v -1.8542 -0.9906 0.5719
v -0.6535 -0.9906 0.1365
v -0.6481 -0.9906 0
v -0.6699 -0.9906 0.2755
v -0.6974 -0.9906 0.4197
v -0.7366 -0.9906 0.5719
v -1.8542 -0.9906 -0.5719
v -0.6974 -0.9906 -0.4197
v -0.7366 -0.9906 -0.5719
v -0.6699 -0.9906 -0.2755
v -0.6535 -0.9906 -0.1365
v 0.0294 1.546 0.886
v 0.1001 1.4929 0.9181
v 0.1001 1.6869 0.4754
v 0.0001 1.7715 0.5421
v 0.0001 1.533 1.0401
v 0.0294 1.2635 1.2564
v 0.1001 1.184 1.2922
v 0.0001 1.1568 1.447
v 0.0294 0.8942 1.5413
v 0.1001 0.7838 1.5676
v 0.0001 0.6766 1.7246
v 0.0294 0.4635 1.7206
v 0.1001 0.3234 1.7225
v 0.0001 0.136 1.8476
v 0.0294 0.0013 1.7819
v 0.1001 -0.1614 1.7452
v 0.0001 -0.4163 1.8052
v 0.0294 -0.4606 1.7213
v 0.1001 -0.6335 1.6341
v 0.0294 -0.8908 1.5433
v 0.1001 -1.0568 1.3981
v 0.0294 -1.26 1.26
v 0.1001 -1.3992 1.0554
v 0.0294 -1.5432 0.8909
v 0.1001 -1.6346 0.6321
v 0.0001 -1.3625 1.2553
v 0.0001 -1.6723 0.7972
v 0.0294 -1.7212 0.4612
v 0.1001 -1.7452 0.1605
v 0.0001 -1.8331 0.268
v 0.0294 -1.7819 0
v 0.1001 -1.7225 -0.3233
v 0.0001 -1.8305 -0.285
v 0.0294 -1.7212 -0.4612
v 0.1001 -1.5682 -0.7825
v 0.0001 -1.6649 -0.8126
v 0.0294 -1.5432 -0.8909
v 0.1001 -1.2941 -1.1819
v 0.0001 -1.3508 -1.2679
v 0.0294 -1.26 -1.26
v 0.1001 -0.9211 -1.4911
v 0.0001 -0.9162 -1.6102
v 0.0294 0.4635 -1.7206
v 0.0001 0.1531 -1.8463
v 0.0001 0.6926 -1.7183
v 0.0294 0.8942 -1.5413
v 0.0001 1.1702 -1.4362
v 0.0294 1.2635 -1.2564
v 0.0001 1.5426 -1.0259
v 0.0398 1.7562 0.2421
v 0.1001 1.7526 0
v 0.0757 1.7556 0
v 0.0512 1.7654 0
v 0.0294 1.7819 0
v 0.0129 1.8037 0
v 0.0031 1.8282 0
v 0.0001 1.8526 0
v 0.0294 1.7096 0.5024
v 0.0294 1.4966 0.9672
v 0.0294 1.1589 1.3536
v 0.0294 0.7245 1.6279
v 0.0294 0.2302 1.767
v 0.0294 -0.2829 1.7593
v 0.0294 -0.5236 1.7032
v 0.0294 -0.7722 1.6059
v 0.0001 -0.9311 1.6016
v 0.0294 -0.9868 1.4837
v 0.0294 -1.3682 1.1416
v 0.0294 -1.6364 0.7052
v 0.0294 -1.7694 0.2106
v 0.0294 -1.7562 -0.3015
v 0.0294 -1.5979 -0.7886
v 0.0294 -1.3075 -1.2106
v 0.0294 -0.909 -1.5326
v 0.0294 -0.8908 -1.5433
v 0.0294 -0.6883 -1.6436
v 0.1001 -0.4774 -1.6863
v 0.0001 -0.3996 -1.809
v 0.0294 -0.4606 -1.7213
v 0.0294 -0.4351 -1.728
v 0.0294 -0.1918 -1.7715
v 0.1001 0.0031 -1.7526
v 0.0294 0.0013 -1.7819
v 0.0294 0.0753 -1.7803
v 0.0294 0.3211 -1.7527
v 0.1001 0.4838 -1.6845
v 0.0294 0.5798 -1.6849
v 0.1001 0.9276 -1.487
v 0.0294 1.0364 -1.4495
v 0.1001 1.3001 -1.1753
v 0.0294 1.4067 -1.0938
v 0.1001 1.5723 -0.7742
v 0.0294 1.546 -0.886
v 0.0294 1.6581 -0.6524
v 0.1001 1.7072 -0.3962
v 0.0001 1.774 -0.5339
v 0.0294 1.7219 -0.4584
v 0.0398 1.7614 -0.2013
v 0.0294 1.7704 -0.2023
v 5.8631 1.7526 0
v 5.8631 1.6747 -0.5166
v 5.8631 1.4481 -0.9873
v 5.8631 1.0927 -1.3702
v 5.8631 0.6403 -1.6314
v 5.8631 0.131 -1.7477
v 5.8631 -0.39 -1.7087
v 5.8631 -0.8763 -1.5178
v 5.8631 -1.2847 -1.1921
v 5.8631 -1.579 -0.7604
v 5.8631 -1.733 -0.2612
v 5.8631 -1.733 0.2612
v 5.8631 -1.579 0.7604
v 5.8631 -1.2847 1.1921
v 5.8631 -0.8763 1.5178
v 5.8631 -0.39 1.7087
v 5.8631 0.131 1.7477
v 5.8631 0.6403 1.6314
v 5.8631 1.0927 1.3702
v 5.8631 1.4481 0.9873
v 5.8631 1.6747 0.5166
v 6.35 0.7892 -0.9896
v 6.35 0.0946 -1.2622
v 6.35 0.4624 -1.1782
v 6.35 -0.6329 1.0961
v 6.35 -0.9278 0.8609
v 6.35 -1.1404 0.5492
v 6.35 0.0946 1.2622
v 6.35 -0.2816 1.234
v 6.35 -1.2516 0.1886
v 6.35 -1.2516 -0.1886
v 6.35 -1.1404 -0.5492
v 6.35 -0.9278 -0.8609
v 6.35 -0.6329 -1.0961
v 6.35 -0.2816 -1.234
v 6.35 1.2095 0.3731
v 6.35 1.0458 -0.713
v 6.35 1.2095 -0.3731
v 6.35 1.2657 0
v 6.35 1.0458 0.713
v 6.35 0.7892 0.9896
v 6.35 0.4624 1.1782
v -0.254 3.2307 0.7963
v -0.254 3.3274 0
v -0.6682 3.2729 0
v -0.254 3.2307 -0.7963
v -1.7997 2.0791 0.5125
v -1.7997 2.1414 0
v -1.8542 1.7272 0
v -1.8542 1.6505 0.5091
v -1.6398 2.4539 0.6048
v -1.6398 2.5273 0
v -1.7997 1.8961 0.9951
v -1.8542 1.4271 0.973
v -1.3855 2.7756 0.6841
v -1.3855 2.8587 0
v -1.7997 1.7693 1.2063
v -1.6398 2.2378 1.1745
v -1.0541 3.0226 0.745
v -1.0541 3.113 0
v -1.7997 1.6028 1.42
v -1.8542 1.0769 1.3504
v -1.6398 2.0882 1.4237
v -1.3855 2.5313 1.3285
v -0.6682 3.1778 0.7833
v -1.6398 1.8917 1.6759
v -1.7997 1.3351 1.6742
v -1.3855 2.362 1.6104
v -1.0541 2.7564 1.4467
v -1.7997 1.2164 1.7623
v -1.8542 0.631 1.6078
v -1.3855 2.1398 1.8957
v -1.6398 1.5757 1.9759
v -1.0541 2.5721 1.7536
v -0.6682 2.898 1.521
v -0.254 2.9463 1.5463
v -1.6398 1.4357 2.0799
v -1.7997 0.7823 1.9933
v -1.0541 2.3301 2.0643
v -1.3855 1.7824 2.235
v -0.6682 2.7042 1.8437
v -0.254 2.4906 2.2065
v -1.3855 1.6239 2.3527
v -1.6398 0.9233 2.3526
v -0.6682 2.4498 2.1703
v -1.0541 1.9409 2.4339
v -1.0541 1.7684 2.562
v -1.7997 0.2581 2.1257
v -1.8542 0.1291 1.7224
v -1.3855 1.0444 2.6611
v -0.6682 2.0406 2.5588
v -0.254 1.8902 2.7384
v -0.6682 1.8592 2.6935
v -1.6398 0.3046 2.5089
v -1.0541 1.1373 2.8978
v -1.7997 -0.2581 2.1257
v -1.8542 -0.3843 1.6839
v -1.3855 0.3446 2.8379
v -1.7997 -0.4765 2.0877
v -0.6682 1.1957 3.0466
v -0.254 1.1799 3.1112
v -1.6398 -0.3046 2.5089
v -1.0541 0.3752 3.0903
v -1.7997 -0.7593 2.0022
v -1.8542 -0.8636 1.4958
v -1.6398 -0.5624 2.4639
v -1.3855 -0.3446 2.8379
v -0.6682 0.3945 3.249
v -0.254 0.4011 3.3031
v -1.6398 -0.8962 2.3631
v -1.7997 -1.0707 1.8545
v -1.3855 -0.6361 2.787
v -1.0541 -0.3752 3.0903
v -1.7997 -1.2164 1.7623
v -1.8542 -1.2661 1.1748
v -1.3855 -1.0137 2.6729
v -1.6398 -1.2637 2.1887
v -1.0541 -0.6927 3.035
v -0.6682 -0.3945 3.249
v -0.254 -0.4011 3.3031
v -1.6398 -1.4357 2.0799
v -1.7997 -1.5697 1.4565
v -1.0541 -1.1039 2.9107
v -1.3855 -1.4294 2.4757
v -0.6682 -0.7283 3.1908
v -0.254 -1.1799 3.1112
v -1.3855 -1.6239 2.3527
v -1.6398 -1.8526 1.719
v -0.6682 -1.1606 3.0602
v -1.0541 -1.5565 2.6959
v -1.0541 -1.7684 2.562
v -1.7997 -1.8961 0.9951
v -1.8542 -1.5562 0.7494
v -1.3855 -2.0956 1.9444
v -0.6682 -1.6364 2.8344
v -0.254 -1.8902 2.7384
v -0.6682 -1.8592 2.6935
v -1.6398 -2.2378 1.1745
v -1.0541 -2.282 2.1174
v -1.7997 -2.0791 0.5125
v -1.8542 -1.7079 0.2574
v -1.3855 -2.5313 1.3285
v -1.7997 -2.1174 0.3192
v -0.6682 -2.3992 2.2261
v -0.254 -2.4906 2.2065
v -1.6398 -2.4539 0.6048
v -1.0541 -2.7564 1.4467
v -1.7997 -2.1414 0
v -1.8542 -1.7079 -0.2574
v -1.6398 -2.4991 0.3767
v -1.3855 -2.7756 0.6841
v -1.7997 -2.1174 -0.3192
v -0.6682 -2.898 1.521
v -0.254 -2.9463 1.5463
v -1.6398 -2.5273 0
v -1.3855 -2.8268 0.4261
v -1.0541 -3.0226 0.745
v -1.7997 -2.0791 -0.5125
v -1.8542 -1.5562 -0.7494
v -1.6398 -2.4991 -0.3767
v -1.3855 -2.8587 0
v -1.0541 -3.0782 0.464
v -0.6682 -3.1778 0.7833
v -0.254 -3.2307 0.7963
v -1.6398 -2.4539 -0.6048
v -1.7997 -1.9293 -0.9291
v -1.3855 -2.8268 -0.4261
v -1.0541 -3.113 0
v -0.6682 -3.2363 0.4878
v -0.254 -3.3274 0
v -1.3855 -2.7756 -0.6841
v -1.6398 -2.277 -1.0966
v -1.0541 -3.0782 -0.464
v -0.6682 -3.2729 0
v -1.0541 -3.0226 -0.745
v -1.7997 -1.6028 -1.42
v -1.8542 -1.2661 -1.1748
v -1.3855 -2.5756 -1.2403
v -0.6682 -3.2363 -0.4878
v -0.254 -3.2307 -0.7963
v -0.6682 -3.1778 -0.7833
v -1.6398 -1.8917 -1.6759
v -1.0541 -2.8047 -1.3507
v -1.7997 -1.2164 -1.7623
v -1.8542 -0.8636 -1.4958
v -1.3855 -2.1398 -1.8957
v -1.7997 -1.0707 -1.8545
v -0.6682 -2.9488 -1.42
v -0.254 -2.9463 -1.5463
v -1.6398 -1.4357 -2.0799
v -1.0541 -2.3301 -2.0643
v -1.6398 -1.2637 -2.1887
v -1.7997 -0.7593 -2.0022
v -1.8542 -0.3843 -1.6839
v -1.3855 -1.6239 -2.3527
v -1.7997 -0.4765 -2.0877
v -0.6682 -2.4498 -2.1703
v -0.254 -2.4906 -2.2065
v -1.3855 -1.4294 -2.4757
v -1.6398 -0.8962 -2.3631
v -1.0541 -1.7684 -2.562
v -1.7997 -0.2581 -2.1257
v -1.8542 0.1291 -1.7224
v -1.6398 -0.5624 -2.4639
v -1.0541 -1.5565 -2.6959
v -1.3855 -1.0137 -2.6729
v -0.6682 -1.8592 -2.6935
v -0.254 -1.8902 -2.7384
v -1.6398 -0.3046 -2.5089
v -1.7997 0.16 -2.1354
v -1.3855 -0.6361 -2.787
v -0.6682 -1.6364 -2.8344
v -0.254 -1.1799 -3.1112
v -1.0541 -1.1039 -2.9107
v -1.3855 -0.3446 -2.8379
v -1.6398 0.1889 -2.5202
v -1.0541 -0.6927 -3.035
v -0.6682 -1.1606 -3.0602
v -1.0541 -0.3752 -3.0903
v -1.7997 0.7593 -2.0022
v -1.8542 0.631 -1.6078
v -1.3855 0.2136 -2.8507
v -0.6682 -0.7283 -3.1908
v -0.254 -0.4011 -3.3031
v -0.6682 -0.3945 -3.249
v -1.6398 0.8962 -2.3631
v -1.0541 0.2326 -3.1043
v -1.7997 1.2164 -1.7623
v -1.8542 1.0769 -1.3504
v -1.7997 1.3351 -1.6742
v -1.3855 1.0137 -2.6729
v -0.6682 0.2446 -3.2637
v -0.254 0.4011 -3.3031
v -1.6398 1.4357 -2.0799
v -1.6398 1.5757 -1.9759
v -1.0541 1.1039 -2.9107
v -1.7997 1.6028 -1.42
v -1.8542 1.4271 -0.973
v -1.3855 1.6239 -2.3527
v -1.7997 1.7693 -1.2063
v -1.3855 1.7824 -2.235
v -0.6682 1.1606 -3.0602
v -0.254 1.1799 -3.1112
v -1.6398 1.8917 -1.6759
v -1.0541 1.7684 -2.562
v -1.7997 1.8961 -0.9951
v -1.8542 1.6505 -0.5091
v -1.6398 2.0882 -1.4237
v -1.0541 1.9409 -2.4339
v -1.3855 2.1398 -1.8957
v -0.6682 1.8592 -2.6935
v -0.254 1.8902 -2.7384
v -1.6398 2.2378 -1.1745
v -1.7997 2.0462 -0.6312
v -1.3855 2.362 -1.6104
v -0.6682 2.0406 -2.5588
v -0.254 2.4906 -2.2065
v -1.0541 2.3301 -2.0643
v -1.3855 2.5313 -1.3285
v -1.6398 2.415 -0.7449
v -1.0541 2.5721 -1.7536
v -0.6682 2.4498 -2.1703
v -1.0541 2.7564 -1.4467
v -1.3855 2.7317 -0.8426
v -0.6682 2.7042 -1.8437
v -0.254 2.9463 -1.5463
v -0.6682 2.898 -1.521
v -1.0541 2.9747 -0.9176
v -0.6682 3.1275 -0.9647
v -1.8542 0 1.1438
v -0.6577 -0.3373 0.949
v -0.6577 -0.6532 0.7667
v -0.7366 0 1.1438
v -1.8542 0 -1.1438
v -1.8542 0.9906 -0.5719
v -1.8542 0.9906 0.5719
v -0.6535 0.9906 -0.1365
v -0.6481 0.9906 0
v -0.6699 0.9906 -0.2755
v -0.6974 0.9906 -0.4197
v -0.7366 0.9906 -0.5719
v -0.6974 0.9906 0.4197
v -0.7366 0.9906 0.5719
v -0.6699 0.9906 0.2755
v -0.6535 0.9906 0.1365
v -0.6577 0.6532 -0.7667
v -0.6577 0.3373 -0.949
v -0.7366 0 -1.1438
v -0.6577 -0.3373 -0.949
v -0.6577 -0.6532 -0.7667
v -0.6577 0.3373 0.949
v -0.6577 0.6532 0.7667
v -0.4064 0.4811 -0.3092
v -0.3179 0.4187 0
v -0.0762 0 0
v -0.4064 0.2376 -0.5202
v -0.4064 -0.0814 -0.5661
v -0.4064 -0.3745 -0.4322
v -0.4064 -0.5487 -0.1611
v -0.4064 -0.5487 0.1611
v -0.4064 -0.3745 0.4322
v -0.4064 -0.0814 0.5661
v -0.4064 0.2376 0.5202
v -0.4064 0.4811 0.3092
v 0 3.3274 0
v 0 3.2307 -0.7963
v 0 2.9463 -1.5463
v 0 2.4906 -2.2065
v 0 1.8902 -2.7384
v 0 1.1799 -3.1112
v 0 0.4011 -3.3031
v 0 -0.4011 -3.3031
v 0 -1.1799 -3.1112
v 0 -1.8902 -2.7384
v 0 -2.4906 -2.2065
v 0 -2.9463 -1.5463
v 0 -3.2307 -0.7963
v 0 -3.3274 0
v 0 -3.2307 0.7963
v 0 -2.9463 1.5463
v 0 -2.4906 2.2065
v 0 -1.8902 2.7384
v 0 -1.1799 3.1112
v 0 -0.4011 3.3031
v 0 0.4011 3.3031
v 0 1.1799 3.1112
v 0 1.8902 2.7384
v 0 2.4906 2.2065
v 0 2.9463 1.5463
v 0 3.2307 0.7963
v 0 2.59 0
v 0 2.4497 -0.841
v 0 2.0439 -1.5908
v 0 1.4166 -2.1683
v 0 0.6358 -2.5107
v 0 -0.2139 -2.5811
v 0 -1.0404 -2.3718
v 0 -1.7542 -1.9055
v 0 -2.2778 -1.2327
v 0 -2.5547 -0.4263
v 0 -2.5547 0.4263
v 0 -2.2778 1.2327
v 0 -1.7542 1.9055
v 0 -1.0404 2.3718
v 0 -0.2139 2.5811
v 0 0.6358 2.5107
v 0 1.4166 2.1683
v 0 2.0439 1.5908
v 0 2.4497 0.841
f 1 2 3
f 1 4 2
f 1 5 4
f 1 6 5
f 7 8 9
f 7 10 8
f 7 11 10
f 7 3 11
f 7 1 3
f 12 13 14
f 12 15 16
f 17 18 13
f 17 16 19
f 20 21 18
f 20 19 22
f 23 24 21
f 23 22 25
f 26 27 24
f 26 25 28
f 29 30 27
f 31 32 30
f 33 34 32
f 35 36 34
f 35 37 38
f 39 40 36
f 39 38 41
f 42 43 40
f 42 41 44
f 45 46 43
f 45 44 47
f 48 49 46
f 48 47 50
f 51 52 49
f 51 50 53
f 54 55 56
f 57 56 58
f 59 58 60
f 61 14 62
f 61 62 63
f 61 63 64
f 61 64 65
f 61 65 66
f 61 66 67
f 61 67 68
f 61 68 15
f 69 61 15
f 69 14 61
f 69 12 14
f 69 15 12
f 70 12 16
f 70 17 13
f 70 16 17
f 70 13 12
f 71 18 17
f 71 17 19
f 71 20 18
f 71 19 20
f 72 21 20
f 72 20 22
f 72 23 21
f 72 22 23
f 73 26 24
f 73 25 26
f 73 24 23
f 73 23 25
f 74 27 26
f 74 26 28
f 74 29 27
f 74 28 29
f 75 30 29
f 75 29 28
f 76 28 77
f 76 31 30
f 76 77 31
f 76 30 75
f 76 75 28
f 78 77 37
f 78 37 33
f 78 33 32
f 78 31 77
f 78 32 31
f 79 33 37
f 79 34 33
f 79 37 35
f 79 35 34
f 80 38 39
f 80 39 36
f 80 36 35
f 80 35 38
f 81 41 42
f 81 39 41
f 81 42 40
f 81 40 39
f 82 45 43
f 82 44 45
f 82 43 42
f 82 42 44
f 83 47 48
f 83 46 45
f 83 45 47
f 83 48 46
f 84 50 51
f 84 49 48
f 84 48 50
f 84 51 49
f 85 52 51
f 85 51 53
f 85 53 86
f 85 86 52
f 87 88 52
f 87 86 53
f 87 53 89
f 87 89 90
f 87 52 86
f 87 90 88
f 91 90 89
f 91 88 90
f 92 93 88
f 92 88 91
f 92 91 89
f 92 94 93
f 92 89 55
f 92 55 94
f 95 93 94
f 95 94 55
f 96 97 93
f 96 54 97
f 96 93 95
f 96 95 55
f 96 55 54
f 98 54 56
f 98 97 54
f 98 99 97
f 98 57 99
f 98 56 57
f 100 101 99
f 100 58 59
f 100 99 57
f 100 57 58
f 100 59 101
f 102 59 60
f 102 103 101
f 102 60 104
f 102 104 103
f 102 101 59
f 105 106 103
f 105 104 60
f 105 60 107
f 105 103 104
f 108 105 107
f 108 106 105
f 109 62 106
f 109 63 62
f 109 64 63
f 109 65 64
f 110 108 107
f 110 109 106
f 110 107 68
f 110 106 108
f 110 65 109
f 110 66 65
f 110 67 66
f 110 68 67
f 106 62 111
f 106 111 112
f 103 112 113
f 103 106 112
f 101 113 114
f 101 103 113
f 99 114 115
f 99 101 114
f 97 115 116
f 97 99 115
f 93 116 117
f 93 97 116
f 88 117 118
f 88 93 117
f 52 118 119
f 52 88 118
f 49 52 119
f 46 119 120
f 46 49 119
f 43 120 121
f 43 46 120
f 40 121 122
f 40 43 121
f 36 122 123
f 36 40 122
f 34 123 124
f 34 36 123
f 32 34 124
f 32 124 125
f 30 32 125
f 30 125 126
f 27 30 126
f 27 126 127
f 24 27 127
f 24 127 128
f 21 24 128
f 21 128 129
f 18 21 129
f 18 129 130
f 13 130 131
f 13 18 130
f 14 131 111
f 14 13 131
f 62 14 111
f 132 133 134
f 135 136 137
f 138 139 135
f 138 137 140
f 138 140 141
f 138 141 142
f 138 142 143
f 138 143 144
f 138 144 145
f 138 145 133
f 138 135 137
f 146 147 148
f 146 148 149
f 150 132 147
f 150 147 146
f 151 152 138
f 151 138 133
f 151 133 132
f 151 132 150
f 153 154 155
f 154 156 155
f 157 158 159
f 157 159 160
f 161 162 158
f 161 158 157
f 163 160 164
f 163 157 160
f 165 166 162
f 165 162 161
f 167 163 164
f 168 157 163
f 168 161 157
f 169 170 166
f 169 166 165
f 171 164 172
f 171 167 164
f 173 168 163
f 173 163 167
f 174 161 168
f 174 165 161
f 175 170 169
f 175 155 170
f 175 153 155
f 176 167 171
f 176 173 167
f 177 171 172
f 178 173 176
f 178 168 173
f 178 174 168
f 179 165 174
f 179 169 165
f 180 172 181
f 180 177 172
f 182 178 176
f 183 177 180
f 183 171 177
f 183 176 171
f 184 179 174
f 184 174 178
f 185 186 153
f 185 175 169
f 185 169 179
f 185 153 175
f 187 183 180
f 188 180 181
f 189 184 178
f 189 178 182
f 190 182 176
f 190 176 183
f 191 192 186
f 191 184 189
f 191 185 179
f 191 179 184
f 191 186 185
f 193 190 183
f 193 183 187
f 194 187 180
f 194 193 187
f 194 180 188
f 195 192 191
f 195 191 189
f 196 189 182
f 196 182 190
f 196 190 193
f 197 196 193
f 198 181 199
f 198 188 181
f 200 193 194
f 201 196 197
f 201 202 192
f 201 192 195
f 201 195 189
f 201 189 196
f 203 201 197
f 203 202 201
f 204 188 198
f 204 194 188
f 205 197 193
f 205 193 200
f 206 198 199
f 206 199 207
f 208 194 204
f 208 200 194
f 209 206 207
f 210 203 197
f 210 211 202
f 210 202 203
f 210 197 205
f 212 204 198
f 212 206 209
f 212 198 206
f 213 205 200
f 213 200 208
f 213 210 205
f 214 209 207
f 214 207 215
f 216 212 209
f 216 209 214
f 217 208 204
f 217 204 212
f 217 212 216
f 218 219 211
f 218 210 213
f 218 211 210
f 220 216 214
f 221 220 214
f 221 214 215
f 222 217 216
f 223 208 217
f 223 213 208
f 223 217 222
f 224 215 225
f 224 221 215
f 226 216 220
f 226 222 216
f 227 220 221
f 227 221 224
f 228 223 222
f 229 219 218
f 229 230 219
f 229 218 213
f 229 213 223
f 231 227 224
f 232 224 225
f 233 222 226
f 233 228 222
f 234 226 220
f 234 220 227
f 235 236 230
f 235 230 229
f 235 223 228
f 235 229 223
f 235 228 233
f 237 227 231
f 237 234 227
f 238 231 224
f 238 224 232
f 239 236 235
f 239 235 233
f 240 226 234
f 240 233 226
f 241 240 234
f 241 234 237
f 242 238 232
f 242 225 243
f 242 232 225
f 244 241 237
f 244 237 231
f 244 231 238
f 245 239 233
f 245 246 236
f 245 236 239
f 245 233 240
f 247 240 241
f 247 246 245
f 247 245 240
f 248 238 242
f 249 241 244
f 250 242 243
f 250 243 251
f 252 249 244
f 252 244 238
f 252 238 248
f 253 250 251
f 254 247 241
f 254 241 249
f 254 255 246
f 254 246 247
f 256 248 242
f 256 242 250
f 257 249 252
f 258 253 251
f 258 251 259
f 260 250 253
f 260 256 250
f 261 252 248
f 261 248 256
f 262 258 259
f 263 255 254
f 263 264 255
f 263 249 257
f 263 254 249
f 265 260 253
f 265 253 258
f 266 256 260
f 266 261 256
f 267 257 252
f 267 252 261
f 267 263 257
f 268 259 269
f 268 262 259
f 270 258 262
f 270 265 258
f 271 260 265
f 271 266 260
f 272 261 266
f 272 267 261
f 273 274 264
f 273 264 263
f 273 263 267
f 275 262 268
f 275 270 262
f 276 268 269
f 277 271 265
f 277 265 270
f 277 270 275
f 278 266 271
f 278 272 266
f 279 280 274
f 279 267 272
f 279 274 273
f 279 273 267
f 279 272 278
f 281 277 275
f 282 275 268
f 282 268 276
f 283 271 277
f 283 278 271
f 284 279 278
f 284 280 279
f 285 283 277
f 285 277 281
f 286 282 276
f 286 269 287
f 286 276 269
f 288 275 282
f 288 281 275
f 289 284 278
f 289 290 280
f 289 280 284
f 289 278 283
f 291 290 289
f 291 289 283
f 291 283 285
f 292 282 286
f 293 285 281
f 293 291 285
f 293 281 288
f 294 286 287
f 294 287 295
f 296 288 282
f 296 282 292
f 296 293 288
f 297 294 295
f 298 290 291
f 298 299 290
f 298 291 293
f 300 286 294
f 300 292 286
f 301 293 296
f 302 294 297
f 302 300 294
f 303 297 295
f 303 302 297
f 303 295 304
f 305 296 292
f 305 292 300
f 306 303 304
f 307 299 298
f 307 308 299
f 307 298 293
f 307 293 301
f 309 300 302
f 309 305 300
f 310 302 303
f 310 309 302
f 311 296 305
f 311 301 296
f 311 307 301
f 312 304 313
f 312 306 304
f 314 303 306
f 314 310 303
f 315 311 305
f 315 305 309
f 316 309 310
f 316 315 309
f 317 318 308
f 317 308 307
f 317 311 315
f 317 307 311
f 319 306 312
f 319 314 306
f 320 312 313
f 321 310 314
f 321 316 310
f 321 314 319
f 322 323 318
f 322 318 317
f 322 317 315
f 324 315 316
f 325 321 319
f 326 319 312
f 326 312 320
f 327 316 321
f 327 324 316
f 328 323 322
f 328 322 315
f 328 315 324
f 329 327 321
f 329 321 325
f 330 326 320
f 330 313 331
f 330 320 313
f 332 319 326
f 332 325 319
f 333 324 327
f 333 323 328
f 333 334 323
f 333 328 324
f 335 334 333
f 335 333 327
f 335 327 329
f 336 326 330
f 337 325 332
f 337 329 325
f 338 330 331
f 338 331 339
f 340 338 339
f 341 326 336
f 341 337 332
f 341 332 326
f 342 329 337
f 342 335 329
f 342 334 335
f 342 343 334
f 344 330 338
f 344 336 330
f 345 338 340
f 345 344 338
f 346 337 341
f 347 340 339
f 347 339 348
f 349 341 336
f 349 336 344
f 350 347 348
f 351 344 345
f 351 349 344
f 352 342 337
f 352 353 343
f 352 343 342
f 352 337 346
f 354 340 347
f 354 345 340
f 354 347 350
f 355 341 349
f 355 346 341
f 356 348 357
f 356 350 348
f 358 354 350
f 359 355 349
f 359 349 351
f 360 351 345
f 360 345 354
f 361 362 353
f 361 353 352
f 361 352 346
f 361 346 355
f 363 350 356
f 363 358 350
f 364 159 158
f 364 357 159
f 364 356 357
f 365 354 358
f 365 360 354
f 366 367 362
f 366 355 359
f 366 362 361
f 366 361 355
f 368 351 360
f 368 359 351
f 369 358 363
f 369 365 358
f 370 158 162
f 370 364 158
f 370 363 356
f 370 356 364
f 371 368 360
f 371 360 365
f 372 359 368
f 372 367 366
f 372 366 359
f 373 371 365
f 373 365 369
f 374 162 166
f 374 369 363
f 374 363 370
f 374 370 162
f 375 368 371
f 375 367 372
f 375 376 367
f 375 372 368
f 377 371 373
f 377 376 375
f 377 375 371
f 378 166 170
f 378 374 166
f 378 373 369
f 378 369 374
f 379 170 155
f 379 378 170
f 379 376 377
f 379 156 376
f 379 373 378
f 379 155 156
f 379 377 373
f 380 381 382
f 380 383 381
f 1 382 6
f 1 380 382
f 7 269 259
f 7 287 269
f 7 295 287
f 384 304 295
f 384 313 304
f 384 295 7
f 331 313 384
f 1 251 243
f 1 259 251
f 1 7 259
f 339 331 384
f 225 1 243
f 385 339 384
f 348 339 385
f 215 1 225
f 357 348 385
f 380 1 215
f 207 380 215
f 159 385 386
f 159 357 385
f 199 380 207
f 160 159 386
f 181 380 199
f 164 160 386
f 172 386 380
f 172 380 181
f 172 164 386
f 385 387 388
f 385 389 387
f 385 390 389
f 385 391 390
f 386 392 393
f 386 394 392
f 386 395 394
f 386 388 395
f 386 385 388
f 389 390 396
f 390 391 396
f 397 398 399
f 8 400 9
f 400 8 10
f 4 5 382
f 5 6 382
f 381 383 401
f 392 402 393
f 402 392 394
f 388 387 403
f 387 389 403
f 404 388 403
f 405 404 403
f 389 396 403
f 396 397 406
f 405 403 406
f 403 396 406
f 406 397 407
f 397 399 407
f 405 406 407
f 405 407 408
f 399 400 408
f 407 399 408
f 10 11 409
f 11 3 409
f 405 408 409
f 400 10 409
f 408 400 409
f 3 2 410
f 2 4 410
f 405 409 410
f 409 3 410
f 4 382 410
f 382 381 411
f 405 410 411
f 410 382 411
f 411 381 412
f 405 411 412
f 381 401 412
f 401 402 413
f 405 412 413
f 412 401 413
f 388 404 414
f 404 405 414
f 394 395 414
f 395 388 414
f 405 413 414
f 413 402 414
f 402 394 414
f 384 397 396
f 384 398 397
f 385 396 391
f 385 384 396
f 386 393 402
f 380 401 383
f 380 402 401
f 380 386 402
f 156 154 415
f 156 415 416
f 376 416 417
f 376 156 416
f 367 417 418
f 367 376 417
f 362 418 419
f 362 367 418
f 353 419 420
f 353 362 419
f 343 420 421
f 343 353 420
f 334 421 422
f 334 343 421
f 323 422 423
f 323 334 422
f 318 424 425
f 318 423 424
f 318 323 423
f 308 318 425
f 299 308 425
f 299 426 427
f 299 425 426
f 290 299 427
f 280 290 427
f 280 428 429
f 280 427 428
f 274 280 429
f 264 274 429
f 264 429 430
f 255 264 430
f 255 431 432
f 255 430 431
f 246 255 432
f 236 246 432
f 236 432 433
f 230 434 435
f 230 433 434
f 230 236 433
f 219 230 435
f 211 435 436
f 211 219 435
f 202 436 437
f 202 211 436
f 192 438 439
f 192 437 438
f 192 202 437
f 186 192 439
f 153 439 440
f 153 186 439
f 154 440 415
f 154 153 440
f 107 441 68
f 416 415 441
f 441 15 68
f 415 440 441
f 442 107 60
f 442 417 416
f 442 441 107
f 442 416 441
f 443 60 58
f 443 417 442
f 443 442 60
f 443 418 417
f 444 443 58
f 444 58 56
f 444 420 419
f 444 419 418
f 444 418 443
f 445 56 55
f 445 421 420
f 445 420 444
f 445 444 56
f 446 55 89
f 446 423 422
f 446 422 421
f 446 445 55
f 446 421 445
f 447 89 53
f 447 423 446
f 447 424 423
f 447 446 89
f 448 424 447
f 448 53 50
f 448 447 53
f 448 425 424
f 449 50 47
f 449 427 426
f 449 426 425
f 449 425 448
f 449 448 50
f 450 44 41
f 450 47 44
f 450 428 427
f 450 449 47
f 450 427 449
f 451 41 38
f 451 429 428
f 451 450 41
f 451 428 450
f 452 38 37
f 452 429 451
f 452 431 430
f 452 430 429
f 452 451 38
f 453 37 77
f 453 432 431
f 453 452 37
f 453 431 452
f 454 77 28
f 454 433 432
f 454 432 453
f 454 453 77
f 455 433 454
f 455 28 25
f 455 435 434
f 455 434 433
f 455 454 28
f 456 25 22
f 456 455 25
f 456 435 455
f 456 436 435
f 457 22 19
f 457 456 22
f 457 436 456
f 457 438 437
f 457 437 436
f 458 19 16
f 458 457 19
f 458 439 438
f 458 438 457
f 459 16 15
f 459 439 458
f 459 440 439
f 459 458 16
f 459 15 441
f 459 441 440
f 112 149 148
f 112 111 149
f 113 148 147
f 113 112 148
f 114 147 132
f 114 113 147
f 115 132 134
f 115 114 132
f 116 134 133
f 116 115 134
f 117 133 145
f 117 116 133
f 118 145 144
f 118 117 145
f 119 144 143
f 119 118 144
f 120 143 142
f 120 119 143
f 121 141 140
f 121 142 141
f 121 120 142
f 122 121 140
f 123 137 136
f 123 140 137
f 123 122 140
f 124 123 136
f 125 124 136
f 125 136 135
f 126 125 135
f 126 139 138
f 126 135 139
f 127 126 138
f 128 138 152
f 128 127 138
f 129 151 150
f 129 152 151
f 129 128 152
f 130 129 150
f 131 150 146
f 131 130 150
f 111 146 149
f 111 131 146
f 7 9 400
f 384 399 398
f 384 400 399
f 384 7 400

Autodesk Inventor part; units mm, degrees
ref_plane "YZ Plane" through (0, 0, 0) normal (1, 0, 0) x (0, 1, 0)
ref_plane "XZ Plane" through (0, 0, 0) normal (0, 1, 0) x (-1, 0, 0)
sketch "Sketch1" plane through (0, 0, 0) normal (0, 0, 1) x (1, 0, 0)
  line L0 (-0.0762, 0) -> (6.35, 0)
  line L1 (6.35, 0) -> (6.35, 1.7526)
  line L2 (6.35, 1.7526) -> (1.5902, 1.7526)
  line L3 (1.5902, 1.7526) -> (0.0001, 1.7526)
  line L4 (0.0001, 1.7526) -> (0, 1.7526)
  line L5 (0, 1.7526) -> (0, 3.3274)
  line L6 (0, 3.3274) -> (-1.8542, 3.3274)
  line L7 (-1.8542, 3.3274) -> (-1.8542, 1.1438)
  line L8 (-1.8542, 1.1438) -> (-0.7366, 1.1438)
  line L9 (-0.7366, 1.1438) -> (-0.0762, 0)
  line L10 (-3.495, 0) -> (7.9908, 0) projected
  line L11 (0, -0.6655) -> (0, 3.9929) projected
  line L12 (1.5902, 1.7526) -> (0, 1.7526) construction
  dimension "d1" = 4.7598
  dimension "d2" = 1.5901
  dimension "d3" = 1.8542
  dimension "d4" = 1.1176
  dimension "d5" = 60
  dimension "d6" = 3.5052
  dimension "d7" = 3.5052
  dimension "d8" = 2.2877
  dimension "d9" = 6.6548
  dimension "d26" = 6.35
revolve "Body" add sketch "Sketch1" angle 360 about axis through (-0.0762, 0, 0) along (1, 0, 0)
sketch "Sketch2" plane through (-1.8542, 0, 0) normal (-1, 0, 0) x (0, 0, 1)
  circle A0 centre (0, 0) radius 1.1438 projected
  line L0 (0, -4.6584) -> (0, 4.6584) projected
  line L1 (-4.6584, 0) -> (4.6584, 0) projected
  line L2 (1.1438, 0) -> (0.5719, -0.9906)
  line L3 (0.5719, -0.9906) -> (-0.5719, -0.9906)
  line L4 (-0.5719, -0.9906) -> (-1.1438, 0)
  line L5 (-1.1438, 0) -> (-0.5719, 0.9906)
  line L6 (-0.5719, 0.9906) -> (0.5719, 0.9906)
  line L7 (0.5719, 0.9906) -> (1.1438, 0)
  point P0 (0, 0)
extrude "Slot" add sketch "Sketch2" against normal up to next contours L7 A0 | A0 L2 | L6 L0 A0 | A0 L0 L3 | L0 L6 A0 | A0 L3 L0 | L4 A0 | A0 L5
fillet "Fillet1" radius 1.6002 1 edges at (-1.8542, -3.3274, 0)
thread "Thread" size "6-32 UNC" class "2A" standard "ANSI Unified Screw Threads" length 4.7598
chamfer "Chamfer1" distance 0.4869 distance2 0.4869 1 edges at (6.35, -1.7526, 0) measured on face at (6.35, -0.5672, -0.1398)
ref_plane "Work Plane1" through (29, 0, 0) normal (0, -1, 0) x (1, 0, 0)
fillet "Fillet2" radius 0.1 1 edges at (0.0001, -1.7526, 0)
equation "\"d1\" = GEL"
equation "\"d3\" = KOH"
equation "\"d4\" = INTI"
equation "\"d6\" = GD"
equation "\"d7\" = BDM"
equation "\"d8\" = 1.1547 * SW"
equation "\"d9\" = KOD"
equation "\"d26\" = NLG"
equation "\"d30\" = R"
equation "\"d17\" = RR"
equation "\"d13\" = GEL"
equation "\"d15\" = -0.5 * SPD + 0.5 * GD"
equation "\"d16\" = GUL"
equation "\"GD\" = NND"
equation "\"NLG\" = 6.35"
equation "\"GEL\" = 4.75976"
equation "\"KOD\" = 6.6548"
equation "\"KOH\" = 1.8542"
equation "\"INTI\" = 1.1176"
equation "\"GAL\" = 1.59004"
equation "\"GUL\" = 0.48692"
equation "\"BDM\" = NND"
equation "\"SW\" = 1.9812"
equation "\"RR\" = 1.6002"
equation "\"SPD\" = 2.53136"
equation "\"R\" = 0.1"
equation "\"TOA\" = 30deg"
equation "\"GD1\" = SPD"
equation "\"THREADDIA\" = 3.5052"
equation "\"KOH1\" = 0.381"
equation "\"NND\" = 3.5052"
equation "\"E0\" = 2.28829"
properties part number "ANSI B18.3 - 6 - 32 x 1/4" material "Steel, Mild"
